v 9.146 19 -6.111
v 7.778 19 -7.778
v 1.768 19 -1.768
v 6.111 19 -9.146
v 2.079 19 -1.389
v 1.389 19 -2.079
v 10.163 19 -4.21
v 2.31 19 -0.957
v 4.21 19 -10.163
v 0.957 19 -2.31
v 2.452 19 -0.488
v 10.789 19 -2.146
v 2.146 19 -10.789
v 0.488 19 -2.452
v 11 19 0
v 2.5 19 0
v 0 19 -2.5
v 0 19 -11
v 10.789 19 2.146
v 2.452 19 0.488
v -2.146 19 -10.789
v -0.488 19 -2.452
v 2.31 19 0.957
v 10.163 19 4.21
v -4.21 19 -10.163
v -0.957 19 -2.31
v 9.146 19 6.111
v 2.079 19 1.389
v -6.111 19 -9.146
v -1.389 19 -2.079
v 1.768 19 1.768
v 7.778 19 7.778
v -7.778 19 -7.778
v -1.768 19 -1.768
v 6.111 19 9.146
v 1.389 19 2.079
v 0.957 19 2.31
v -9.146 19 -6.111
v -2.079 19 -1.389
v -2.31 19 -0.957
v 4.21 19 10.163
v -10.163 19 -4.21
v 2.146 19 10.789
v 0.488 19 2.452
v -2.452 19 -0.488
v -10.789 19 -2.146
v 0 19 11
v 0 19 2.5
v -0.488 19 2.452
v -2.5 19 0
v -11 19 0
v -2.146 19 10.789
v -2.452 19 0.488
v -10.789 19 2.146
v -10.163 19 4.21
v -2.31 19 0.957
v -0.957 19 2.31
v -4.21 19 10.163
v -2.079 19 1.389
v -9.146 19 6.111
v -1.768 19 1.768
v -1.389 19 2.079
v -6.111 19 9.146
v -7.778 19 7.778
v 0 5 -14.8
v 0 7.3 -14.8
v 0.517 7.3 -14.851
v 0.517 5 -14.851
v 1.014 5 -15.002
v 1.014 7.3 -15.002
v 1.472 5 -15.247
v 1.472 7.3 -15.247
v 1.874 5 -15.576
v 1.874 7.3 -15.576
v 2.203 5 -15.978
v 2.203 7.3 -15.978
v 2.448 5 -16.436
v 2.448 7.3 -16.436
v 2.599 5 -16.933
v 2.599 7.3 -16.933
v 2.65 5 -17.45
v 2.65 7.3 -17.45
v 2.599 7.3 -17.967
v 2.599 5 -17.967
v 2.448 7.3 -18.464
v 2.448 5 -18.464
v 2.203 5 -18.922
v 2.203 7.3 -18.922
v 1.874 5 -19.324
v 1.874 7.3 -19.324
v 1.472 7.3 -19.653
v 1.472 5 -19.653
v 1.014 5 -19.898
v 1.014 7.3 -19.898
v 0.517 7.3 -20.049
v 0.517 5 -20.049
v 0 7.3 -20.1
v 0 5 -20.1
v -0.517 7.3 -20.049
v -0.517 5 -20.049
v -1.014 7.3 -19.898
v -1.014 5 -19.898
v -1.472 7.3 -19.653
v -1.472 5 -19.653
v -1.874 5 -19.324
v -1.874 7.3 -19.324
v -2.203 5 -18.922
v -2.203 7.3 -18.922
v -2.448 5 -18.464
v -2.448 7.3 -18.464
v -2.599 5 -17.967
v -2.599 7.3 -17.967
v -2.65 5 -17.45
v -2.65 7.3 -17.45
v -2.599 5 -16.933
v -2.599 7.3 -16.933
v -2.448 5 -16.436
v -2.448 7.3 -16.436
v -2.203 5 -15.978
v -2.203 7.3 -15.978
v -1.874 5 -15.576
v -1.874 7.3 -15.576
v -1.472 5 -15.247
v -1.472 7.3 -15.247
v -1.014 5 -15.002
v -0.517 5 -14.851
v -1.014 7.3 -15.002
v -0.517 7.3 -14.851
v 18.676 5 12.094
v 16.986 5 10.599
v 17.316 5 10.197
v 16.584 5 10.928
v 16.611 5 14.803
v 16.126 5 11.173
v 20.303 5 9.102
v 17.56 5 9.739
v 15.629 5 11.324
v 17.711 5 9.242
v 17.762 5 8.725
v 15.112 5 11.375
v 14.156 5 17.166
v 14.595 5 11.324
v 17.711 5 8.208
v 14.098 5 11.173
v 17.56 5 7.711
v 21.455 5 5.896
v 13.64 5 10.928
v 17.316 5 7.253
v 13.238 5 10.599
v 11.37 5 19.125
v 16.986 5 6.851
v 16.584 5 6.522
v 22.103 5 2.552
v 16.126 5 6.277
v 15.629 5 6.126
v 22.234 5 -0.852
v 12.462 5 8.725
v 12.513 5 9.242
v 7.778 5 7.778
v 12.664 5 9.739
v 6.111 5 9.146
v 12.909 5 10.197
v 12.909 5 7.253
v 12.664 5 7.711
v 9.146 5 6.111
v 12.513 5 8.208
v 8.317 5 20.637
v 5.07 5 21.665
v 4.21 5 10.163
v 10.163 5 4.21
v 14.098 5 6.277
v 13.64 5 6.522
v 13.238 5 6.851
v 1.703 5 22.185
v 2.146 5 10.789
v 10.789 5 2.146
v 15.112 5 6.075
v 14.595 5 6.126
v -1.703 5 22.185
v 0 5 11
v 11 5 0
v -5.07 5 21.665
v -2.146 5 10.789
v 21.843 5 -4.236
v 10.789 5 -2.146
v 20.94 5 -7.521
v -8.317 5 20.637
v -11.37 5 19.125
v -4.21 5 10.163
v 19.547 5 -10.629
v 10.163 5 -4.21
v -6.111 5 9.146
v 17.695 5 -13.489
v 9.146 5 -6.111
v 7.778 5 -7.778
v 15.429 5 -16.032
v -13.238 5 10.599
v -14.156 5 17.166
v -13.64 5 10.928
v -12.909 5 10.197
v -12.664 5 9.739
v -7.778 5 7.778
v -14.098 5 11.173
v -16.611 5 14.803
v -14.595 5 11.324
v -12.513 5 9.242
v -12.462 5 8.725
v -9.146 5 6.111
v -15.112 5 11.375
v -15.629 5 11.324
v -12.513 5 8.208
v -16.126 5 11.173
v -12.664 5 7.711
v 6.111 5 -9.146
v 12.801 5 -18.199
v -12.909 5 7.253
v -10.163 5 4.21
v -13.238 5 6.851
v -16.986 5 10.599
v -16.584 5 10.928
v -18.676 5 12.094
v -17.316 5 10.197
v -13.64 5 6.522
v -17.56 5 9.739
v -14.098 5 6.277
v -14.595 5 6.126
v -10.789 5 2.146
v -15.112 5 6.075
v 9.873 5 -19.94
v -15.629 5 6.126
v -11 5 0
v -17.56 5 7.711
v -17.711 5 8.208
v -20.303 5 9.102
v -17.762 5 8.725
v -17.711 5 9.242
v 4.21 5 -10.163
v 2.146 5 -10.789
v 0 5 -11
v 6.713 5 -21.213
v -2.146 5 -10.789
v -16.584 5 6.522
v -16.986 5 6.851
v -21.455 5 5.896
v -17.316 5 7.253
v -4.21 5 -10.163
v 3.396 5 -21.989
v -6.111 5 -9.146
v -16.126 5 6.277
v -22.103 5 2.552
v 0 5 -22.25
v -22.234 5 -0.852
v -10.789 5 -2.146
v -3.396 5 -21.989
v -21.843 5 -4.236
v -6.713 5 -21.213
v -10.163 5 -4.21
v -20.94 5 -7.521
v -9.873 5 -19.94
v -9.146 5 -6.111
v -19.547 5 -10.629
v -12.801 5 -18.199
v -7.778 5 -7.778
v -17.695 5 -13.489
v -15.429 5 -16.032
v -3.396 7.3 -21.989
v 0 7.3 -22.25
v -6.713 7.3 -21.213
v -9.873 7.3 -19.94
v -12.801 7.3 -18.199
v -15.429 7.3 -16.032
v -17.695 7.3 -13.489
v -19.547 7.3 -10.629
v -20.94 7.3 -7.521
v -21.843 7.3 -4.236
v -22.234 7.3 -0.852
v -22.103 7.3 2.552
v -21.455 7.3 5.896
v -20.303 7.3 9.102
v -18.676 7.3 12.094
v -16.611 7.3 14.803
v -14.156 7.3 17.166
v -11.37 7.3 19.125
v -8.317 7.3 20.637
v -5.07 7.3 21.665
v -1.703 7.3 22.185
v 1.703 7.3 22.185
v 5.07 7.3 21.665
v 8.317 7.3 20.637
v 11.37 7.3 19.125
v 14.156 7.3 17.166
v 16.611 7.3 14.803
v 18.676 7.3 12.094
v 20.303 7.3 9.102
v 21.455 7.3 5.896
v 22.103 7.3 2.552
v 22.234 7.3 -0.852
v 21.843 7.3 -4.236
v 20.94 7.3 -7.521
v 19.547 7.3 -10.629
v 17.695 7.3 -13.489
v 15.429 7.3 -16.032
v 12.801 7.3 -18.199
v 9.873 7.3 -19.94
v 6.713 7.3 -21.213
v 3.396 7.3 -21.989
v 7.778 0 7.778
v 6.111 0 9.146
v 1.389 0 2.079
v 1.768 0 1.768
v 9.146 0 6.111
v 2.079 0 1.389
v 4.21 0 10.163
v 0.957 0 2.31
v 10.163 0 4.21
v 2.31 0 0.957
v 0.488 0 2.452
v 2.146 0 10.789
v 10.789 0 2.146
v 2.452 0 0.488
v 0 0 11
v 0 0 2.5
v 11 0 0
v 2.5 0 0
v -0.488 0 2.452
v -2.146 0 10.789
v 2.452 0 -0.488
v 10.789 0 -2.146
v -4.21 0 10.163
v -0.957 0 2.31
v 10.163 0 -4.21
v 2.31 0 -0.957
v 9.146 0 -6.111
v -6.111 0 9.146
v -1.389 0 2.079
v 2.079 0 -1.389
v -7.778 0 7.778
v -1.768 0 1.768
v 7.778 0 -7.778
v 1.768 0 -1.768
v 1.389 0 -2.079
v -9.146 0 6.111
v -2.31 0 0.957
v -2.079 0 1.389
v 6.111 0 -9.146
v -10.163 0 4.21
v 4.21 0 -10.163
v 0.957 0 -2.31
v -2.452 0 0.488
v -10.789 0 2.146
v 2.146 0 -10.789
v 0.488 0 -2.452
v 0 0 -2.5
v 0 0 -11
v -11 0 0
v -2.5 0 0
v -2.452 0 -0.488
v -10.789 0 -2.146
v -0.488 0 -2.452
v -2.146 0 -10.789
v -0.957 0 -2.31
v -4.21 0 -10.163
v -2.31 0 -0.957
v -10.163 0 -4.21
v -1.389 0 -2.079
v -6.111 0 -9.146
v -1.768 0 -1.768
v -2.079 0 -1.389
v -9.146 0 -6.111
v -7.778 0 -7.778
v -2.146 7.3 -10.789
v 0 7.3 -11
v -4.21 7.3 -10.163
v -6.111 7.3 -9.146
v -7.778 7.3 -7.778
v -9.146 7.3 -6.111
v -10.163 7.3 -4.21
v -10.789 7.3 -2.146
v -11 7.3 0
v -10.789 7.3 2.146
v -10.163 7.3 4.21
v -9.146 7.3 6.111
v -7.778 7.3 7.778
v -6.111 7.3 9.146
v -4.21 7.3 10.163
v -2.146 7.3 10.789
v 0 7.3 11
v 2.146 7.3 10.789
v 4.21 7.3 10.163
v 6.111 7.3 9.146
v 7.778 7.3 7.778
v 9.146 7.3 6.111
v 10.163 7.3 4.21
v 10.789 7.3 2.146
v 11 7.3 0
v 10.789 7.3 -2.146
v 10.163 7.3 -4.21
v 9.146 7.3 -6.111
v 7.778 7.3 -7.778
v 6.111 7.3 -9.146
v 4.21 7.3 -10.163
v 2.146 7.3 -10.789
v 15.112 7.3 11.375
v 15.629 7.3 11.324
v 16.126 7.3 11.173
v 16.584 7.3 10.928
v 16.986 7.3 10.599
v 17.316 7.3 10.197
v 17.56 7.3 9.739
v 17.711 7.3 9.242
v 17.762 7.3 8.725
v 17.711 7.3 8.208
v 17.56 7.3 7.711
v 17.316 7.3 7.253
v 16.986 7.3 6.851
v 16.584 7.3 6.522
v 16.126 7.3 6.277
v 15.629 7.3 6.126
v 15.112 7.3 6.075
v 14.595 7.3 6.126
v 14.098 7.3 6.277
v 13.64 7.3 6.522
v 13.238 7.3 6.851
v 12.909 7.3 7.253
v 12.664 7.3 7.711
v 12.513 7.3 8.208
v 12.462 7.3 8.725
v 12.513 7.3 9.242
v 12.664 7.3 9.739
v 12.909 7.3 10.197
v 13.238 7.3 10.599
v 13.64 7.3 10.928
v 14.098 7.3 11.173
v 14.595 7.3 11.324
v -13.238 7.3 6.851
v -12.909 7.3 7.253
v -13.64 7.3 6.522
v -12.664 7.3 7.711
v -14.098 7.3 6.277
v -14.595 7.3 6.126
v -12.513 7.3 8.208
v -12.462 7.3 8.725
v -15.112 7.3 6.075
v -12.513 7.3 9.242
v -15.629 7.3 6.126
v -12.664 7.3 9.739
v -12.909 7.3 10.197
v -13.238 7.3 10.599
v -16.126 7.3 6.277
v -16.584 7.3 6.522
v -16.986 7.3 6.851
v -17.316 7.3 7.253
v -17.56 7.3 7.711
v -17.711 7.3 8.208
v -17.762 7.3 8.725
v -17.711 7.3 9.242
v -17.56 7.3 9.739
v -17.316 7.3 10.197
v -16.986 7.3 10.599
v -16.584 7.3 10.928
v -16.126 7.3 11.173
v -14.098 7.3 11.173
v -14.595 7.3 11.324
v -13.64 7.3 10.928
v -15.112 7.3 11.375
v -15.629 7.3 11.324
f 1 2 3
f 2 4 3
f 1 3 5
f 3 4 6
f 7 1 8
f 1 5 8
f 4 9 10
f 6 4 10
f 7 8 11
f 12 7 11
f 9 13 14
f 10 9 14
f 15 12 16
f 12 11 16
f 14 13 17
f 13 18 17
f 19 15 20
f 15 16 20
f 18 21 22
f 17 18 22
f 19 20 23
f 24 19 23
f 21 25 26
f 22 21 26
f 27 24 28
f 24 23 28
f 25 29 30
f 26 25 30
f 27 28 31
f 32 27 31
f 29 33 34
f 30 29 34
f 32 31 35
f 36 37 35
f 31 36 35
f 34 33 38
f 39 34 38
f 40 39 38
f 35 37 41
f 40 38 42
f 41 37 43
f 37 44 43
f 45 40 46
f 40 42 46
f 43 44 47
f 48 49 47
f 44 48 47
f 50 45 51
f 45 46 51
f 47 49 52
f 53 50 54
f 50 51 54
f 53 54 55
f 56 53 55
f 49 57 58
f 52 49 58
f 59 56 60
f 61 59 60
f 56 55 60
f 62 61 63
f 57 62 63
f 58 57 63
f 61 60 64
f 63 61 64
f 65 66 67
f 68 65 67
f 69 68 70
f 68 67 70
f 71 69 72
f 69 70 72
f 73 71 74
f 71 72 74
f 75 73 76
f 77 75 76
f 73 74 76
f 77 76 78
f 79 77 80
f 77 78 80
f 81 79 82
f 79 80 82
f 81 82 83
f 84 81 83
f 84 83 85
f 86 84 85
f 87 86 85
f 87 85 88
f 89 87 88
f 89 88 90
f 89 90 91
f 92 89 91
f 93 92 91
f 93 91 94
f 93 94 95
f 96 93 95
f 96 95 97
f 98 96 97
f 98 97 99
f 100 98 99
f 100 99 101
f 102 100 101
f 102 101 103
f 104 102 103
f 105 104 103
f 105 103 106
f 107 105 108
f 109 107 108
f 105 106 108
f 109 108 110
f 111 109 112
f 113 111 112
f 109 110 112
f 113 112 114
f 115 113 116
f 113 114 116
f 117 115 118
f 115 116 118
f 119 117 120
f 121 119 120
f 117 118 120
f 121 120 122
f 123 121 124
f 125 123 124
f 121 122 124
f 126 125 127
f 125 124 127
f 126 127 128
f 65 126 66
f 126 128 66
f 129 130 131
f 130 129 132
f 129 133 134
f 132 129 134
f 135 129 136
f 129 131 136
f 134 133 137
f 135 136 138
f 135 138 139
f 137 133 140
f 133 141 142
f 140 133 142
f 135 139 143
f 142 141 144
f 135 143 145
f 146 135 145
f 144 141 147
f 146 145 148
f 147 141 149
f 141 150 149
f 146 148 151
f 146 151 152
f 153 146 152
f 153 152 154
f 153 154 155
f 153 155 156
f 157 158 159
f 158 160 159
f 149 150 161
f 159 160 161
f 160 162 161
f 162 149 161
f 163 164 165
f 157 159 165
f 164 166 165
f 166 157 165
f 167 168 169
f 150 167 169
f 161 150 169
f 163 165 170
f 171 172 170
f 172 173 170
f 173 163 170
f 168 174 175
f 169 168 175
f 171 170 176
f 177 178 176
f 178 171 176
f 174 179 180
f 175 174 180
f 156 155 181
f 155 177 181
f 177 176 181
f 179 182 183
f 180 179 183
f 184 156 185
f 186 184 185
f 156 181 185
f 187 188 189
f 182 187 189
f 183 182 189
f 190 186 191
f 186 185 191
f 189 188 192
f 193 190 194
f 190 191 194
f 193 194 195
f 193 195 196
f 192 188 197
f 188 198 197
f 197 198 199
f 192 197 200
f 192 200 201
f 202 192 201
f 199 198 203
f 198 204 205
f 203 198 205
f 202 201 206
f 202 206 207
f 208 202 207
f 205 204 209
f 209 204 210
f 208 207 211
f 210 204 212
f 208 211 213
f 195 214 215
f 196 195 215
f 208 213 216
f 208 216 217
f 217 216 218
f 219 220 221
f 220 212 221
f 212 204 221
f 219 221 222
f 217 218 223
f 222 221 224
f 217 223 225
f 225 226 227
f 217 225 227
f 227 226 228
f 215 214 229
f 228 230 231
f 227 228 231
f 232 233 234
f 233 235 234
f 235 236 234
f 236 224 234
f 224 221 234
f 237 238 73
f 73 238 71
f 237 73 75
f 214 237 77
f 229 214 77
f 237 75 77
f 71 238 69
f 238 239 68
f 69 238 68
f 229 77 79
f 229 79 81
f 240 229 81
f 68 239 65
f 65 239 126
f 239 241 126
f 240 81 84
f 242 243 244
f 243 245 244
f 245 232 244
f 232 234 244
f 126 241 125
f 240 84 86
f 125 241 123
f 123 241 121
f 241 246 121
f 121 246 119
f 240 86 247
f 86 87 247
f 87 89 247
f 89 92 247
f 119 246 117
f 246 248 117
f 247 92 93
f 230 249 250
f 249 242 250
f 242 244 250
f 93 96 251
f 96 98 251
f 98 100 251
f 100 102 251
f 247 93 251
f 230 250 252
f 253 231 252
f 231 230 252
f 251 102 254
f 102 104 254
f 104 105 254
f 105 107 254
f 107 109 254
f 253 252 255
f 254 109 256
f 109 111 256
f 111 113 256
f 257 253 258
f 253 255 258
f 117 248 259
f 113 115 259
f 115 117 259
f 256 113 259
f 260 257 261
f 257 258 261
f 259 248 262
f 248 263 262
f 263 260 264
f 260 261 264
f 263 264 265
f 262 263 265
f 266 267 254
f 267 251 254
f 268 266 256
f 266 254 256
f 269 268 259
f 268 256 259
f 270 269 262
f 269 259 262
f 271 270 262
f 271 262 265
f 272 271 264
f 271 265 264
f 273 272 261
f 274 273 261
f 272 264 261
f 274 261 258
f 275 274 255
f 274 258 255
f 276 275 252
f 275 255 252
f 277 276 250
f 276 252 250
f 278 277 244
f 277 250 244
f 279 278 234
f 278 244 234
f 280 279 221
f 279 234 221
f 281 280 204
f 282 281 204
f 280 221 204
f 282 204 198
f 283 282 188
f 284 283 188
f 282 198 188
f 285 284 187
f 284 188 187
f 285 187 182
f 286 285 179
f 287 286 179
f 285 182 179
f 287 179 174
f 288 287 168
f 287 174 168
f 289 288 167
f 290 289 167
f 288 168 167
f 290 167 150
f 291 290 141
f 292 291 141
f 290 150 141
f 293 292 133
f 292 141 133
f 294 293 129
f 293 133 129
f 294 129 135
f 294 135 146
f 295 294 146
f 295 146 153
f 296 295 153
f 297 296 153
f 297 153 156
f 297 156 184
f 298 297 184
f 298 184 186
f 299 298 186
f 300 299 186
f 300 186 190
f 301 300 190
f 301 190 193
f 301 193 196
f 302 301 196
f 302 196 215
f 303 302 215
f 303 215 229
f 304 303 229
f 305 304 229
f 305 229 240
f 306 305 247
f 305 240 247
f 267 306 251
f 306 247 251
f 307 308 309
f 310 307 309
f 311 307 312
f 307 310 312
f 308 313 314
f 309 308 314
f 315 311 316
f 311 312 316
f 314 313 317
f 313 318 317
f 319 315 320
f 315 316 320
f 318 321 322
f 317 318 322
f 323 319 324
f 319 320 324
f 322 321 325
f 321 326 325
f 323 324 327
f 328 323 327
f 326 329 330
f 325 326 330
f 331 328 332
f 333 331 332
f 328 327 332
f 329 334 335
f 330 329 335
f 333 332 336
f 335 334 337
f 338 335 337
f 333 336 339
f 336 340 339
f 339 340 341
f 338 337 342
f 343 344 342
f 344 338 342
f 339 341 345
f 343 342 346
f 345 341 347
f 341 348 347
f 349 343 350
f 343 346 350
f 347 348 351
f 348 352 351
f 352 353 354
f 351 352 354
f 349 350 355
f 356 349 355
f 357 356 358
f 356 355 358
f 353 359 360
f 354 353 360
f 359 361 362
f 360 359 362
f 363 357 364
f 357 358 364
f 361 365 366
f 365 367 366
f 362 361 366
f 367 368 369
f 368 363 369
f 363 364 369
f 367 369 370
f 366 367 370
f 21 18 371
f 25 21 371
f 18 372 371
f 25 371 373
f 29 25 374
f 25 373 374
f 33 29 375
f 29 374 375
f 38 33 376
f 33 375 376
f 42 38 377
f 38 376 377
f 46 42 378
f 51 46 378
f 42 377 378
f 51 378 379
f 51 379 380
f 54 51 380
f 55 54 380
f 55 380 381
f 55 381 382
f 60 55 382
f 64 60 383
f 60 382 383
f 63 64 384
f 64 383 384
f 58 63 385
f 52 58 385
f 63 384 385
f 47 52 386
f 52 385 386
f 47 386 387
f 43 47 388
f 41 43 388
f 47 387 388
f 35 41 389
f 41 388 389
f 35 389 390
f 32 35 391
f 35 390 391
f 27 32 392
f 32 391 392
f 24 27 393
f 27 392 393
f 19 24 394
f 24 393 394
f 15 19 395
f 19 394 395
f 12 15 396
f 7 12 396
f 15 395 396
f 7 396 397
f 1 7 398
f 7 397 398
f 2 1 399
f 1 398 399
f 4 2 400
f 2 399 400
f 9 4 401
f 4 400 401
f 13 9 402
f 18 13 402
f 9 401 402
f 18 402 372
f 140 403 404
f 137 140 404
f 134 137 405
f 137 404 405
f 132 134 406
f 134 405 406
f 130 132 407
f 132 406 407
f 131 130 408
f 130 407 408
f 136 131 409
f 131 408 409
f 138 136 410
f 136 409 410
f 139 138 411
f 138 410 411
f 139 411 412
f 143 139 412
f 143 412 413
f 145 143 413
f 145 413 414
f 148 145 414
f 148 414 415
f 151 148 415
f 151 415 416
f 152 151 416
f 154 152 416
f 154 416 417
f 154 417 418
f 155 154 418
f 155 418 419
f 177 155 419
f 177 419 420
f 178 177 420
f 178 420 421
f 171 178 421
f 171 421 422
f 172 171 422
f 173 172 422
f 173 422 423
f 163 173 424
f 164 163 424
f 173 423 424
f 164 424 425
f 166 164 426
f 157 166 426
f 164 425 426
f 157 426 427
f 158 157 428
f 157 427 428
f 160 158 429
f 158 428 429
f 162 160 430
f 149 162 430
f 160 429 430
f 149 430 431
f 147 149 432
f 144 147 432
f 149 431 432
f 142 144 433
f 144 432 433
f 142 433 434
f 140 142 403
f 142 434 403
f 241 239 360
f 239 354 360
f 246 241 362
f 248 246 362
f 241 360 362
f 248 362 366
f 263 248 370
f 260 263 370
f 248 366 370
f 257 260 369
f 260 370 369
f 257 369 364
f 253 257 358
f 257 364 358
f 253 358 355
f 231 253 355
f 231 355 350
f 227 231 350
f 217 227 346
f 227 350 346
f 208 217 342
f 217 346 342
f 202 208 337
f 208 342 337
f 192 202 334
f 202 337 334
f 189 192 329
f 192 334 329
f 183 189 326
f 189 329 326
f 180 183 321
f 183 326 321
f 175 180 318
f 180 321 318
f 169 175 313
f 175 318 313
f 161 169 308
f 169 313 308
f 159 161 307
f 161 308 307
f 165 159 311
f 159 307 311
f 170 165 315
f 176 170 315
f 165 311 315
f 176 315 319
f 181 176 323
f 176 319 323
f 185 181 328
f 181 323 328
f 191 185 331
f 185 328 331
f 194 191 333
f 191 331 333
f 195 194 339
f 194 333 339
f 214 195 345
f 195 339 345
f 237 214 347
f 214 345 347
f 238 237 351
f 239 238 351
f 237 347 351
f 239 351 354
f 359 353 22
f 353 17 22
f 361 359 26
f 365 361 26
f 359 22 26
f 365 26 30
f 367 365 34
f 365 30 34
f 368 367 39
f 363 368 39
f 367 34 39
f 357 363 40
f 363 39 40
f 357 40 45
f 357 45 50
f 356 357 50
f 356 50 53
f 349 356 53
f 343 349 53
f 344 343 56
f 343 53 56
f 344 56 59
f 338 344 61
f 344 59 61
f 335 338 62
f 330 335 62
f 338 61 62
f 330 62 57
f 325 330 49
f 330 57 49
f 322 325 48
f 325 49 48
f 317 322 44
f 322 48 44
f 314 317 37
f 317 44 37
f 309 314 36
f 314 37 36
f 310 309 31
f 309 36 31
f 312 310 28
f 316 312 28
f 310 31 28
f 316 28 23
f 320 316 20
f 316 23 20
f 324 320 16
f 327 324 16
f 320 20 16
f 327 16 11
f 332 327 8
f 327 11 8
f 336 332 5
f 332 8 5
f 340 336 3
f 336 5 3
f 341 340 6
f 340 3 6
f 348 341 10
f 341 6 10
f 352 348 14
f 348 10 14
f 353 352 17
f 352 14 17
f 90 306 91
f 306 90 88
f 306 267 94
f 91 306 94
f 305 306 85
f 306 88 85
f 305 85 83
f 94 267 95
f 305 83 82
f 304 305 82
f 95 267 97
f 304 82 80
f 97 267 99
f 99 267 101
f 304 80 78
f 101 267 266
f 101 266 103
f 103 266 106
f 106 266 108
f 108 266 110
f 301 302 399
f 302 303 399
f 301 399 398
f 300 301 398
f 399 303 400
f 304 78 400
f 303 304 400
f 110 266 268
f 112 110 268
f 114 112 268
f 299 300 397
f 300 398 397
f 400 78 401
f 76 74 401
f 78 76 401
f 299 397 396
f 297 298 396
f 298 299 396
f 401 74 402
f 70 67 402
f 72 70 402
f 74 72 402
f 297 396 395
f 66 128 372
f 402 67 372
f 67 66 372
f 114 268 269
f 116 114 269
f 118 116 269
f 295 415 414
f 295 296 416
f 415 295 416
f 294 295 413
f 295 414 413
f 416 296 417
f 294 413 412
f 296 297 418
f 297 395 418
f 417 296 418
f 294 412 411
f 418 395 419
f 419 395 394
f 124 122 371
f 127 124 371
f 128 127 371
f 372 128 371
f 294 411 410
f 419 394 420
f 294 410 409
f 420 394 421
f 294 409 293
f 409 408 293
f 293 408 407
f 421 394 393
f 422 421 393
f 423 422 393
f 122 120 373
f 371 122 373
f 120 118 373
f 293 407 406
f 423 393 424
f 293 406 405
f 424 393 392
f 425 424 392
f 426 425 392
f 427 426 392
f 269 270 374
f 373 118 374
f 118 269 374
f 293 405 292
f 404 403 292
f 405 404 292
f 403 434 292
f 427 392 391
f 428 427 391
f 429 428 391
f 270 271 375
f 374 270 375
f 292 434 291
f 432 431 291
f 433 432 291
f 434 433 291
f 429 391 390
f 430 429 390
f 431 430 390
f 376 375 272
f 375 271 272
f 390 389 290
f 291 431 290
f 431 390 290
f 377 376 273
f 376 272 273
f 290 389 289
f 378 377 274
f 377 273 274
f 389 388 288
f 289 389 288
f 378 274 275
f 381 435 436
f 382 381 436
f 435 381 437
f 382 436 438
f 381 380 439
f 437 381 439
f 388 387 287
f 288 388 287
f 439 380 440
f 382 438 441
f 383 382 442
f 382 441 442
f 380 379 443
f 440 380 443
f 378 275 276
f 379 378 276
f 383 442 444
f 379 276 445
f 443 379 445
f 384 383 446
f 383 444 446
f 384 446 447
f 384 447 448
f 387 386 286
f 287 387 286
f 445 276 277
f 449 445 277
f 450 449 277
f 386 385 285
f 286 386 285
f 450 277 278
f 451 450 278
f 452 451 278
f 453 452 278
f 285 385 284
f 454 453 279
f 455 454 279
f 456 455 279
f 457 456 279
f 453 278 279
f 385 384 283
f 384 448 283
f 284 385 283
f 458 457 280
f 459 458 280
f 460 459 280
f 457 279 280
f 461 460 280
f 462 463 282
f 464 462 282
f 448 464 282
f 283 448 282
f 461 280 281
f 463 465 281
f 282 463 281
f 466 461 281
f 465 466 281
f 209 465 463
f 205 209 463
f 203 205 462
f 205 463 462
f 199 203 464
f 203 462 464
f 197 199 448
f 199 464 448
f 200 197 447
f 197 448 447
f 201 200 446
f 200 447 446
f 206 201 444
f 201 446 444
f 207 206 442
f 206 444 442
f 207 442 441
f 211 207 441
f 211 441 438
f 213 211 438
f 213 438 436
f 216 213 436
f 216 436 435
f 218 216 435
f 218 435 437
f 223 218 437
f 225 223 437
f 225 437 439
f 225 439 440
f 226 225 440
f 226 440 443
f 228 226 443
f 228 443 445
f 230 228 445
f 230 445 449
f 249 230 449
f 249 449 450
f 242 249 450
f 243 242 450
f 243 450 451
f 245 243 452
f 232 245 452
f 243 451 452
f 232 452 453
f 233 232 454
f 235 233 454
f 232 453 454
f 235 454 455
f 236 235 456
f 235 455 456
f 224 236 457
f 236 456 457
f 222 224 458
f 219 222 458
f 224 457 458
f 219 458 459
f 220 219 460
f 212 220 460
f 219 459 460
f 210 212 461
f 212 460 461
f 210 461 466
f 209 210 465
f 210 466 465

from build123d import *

# Parameters (mm, degrees)
SKETCH2_R          = 2.65
CUT_EXTRUDE1_DEPTH = 34.571044071


with BuildPart() as part:
    # Sketch1 → Revolve1 (revolve)
    with BuildSketch(Plane.XY, mode=Mode.PRIVATE) as revolve1_sk:
        Polygon((-2.5, 0), (-2.5, 19), (-11, 19), (-11, 7.3), (-22.25, 7.3), (-22.25, 5), (-11, 5), (-11, 0), align=None)
    revolve(revolve1_sk.sketch.rotate(Axis((0, 0, 0), (0, 1, 0)), 270), axis=Axis((0, 0, 0), (0, 1, 0)))

    # Sketch2 → Cut-Extrude1 (cut, through all)
    with BuildSketch(Plane(origin=(0, 7.3, 0), x_dir=(1, 0, 0), z_dir=(0, 1, 0))):
        with Locations(Location((0, 17.45, 0), (0, 0, 270))):
            Circle(SKETCH2_R)
        with Locations(Location((15.112143296, -8.725, 0), (0, 0, 270))):
            Circle(SKETCH2_R)
        with Locations(Location((-15.112143296, -8.725, 0), (0, 0, 270))):
            Circle(SKETCH2_R)
    extrude(amount=-CUT_EXTRUDE1_DEPTH, mode=Mode.SUBTRACT)


solid = part.part
